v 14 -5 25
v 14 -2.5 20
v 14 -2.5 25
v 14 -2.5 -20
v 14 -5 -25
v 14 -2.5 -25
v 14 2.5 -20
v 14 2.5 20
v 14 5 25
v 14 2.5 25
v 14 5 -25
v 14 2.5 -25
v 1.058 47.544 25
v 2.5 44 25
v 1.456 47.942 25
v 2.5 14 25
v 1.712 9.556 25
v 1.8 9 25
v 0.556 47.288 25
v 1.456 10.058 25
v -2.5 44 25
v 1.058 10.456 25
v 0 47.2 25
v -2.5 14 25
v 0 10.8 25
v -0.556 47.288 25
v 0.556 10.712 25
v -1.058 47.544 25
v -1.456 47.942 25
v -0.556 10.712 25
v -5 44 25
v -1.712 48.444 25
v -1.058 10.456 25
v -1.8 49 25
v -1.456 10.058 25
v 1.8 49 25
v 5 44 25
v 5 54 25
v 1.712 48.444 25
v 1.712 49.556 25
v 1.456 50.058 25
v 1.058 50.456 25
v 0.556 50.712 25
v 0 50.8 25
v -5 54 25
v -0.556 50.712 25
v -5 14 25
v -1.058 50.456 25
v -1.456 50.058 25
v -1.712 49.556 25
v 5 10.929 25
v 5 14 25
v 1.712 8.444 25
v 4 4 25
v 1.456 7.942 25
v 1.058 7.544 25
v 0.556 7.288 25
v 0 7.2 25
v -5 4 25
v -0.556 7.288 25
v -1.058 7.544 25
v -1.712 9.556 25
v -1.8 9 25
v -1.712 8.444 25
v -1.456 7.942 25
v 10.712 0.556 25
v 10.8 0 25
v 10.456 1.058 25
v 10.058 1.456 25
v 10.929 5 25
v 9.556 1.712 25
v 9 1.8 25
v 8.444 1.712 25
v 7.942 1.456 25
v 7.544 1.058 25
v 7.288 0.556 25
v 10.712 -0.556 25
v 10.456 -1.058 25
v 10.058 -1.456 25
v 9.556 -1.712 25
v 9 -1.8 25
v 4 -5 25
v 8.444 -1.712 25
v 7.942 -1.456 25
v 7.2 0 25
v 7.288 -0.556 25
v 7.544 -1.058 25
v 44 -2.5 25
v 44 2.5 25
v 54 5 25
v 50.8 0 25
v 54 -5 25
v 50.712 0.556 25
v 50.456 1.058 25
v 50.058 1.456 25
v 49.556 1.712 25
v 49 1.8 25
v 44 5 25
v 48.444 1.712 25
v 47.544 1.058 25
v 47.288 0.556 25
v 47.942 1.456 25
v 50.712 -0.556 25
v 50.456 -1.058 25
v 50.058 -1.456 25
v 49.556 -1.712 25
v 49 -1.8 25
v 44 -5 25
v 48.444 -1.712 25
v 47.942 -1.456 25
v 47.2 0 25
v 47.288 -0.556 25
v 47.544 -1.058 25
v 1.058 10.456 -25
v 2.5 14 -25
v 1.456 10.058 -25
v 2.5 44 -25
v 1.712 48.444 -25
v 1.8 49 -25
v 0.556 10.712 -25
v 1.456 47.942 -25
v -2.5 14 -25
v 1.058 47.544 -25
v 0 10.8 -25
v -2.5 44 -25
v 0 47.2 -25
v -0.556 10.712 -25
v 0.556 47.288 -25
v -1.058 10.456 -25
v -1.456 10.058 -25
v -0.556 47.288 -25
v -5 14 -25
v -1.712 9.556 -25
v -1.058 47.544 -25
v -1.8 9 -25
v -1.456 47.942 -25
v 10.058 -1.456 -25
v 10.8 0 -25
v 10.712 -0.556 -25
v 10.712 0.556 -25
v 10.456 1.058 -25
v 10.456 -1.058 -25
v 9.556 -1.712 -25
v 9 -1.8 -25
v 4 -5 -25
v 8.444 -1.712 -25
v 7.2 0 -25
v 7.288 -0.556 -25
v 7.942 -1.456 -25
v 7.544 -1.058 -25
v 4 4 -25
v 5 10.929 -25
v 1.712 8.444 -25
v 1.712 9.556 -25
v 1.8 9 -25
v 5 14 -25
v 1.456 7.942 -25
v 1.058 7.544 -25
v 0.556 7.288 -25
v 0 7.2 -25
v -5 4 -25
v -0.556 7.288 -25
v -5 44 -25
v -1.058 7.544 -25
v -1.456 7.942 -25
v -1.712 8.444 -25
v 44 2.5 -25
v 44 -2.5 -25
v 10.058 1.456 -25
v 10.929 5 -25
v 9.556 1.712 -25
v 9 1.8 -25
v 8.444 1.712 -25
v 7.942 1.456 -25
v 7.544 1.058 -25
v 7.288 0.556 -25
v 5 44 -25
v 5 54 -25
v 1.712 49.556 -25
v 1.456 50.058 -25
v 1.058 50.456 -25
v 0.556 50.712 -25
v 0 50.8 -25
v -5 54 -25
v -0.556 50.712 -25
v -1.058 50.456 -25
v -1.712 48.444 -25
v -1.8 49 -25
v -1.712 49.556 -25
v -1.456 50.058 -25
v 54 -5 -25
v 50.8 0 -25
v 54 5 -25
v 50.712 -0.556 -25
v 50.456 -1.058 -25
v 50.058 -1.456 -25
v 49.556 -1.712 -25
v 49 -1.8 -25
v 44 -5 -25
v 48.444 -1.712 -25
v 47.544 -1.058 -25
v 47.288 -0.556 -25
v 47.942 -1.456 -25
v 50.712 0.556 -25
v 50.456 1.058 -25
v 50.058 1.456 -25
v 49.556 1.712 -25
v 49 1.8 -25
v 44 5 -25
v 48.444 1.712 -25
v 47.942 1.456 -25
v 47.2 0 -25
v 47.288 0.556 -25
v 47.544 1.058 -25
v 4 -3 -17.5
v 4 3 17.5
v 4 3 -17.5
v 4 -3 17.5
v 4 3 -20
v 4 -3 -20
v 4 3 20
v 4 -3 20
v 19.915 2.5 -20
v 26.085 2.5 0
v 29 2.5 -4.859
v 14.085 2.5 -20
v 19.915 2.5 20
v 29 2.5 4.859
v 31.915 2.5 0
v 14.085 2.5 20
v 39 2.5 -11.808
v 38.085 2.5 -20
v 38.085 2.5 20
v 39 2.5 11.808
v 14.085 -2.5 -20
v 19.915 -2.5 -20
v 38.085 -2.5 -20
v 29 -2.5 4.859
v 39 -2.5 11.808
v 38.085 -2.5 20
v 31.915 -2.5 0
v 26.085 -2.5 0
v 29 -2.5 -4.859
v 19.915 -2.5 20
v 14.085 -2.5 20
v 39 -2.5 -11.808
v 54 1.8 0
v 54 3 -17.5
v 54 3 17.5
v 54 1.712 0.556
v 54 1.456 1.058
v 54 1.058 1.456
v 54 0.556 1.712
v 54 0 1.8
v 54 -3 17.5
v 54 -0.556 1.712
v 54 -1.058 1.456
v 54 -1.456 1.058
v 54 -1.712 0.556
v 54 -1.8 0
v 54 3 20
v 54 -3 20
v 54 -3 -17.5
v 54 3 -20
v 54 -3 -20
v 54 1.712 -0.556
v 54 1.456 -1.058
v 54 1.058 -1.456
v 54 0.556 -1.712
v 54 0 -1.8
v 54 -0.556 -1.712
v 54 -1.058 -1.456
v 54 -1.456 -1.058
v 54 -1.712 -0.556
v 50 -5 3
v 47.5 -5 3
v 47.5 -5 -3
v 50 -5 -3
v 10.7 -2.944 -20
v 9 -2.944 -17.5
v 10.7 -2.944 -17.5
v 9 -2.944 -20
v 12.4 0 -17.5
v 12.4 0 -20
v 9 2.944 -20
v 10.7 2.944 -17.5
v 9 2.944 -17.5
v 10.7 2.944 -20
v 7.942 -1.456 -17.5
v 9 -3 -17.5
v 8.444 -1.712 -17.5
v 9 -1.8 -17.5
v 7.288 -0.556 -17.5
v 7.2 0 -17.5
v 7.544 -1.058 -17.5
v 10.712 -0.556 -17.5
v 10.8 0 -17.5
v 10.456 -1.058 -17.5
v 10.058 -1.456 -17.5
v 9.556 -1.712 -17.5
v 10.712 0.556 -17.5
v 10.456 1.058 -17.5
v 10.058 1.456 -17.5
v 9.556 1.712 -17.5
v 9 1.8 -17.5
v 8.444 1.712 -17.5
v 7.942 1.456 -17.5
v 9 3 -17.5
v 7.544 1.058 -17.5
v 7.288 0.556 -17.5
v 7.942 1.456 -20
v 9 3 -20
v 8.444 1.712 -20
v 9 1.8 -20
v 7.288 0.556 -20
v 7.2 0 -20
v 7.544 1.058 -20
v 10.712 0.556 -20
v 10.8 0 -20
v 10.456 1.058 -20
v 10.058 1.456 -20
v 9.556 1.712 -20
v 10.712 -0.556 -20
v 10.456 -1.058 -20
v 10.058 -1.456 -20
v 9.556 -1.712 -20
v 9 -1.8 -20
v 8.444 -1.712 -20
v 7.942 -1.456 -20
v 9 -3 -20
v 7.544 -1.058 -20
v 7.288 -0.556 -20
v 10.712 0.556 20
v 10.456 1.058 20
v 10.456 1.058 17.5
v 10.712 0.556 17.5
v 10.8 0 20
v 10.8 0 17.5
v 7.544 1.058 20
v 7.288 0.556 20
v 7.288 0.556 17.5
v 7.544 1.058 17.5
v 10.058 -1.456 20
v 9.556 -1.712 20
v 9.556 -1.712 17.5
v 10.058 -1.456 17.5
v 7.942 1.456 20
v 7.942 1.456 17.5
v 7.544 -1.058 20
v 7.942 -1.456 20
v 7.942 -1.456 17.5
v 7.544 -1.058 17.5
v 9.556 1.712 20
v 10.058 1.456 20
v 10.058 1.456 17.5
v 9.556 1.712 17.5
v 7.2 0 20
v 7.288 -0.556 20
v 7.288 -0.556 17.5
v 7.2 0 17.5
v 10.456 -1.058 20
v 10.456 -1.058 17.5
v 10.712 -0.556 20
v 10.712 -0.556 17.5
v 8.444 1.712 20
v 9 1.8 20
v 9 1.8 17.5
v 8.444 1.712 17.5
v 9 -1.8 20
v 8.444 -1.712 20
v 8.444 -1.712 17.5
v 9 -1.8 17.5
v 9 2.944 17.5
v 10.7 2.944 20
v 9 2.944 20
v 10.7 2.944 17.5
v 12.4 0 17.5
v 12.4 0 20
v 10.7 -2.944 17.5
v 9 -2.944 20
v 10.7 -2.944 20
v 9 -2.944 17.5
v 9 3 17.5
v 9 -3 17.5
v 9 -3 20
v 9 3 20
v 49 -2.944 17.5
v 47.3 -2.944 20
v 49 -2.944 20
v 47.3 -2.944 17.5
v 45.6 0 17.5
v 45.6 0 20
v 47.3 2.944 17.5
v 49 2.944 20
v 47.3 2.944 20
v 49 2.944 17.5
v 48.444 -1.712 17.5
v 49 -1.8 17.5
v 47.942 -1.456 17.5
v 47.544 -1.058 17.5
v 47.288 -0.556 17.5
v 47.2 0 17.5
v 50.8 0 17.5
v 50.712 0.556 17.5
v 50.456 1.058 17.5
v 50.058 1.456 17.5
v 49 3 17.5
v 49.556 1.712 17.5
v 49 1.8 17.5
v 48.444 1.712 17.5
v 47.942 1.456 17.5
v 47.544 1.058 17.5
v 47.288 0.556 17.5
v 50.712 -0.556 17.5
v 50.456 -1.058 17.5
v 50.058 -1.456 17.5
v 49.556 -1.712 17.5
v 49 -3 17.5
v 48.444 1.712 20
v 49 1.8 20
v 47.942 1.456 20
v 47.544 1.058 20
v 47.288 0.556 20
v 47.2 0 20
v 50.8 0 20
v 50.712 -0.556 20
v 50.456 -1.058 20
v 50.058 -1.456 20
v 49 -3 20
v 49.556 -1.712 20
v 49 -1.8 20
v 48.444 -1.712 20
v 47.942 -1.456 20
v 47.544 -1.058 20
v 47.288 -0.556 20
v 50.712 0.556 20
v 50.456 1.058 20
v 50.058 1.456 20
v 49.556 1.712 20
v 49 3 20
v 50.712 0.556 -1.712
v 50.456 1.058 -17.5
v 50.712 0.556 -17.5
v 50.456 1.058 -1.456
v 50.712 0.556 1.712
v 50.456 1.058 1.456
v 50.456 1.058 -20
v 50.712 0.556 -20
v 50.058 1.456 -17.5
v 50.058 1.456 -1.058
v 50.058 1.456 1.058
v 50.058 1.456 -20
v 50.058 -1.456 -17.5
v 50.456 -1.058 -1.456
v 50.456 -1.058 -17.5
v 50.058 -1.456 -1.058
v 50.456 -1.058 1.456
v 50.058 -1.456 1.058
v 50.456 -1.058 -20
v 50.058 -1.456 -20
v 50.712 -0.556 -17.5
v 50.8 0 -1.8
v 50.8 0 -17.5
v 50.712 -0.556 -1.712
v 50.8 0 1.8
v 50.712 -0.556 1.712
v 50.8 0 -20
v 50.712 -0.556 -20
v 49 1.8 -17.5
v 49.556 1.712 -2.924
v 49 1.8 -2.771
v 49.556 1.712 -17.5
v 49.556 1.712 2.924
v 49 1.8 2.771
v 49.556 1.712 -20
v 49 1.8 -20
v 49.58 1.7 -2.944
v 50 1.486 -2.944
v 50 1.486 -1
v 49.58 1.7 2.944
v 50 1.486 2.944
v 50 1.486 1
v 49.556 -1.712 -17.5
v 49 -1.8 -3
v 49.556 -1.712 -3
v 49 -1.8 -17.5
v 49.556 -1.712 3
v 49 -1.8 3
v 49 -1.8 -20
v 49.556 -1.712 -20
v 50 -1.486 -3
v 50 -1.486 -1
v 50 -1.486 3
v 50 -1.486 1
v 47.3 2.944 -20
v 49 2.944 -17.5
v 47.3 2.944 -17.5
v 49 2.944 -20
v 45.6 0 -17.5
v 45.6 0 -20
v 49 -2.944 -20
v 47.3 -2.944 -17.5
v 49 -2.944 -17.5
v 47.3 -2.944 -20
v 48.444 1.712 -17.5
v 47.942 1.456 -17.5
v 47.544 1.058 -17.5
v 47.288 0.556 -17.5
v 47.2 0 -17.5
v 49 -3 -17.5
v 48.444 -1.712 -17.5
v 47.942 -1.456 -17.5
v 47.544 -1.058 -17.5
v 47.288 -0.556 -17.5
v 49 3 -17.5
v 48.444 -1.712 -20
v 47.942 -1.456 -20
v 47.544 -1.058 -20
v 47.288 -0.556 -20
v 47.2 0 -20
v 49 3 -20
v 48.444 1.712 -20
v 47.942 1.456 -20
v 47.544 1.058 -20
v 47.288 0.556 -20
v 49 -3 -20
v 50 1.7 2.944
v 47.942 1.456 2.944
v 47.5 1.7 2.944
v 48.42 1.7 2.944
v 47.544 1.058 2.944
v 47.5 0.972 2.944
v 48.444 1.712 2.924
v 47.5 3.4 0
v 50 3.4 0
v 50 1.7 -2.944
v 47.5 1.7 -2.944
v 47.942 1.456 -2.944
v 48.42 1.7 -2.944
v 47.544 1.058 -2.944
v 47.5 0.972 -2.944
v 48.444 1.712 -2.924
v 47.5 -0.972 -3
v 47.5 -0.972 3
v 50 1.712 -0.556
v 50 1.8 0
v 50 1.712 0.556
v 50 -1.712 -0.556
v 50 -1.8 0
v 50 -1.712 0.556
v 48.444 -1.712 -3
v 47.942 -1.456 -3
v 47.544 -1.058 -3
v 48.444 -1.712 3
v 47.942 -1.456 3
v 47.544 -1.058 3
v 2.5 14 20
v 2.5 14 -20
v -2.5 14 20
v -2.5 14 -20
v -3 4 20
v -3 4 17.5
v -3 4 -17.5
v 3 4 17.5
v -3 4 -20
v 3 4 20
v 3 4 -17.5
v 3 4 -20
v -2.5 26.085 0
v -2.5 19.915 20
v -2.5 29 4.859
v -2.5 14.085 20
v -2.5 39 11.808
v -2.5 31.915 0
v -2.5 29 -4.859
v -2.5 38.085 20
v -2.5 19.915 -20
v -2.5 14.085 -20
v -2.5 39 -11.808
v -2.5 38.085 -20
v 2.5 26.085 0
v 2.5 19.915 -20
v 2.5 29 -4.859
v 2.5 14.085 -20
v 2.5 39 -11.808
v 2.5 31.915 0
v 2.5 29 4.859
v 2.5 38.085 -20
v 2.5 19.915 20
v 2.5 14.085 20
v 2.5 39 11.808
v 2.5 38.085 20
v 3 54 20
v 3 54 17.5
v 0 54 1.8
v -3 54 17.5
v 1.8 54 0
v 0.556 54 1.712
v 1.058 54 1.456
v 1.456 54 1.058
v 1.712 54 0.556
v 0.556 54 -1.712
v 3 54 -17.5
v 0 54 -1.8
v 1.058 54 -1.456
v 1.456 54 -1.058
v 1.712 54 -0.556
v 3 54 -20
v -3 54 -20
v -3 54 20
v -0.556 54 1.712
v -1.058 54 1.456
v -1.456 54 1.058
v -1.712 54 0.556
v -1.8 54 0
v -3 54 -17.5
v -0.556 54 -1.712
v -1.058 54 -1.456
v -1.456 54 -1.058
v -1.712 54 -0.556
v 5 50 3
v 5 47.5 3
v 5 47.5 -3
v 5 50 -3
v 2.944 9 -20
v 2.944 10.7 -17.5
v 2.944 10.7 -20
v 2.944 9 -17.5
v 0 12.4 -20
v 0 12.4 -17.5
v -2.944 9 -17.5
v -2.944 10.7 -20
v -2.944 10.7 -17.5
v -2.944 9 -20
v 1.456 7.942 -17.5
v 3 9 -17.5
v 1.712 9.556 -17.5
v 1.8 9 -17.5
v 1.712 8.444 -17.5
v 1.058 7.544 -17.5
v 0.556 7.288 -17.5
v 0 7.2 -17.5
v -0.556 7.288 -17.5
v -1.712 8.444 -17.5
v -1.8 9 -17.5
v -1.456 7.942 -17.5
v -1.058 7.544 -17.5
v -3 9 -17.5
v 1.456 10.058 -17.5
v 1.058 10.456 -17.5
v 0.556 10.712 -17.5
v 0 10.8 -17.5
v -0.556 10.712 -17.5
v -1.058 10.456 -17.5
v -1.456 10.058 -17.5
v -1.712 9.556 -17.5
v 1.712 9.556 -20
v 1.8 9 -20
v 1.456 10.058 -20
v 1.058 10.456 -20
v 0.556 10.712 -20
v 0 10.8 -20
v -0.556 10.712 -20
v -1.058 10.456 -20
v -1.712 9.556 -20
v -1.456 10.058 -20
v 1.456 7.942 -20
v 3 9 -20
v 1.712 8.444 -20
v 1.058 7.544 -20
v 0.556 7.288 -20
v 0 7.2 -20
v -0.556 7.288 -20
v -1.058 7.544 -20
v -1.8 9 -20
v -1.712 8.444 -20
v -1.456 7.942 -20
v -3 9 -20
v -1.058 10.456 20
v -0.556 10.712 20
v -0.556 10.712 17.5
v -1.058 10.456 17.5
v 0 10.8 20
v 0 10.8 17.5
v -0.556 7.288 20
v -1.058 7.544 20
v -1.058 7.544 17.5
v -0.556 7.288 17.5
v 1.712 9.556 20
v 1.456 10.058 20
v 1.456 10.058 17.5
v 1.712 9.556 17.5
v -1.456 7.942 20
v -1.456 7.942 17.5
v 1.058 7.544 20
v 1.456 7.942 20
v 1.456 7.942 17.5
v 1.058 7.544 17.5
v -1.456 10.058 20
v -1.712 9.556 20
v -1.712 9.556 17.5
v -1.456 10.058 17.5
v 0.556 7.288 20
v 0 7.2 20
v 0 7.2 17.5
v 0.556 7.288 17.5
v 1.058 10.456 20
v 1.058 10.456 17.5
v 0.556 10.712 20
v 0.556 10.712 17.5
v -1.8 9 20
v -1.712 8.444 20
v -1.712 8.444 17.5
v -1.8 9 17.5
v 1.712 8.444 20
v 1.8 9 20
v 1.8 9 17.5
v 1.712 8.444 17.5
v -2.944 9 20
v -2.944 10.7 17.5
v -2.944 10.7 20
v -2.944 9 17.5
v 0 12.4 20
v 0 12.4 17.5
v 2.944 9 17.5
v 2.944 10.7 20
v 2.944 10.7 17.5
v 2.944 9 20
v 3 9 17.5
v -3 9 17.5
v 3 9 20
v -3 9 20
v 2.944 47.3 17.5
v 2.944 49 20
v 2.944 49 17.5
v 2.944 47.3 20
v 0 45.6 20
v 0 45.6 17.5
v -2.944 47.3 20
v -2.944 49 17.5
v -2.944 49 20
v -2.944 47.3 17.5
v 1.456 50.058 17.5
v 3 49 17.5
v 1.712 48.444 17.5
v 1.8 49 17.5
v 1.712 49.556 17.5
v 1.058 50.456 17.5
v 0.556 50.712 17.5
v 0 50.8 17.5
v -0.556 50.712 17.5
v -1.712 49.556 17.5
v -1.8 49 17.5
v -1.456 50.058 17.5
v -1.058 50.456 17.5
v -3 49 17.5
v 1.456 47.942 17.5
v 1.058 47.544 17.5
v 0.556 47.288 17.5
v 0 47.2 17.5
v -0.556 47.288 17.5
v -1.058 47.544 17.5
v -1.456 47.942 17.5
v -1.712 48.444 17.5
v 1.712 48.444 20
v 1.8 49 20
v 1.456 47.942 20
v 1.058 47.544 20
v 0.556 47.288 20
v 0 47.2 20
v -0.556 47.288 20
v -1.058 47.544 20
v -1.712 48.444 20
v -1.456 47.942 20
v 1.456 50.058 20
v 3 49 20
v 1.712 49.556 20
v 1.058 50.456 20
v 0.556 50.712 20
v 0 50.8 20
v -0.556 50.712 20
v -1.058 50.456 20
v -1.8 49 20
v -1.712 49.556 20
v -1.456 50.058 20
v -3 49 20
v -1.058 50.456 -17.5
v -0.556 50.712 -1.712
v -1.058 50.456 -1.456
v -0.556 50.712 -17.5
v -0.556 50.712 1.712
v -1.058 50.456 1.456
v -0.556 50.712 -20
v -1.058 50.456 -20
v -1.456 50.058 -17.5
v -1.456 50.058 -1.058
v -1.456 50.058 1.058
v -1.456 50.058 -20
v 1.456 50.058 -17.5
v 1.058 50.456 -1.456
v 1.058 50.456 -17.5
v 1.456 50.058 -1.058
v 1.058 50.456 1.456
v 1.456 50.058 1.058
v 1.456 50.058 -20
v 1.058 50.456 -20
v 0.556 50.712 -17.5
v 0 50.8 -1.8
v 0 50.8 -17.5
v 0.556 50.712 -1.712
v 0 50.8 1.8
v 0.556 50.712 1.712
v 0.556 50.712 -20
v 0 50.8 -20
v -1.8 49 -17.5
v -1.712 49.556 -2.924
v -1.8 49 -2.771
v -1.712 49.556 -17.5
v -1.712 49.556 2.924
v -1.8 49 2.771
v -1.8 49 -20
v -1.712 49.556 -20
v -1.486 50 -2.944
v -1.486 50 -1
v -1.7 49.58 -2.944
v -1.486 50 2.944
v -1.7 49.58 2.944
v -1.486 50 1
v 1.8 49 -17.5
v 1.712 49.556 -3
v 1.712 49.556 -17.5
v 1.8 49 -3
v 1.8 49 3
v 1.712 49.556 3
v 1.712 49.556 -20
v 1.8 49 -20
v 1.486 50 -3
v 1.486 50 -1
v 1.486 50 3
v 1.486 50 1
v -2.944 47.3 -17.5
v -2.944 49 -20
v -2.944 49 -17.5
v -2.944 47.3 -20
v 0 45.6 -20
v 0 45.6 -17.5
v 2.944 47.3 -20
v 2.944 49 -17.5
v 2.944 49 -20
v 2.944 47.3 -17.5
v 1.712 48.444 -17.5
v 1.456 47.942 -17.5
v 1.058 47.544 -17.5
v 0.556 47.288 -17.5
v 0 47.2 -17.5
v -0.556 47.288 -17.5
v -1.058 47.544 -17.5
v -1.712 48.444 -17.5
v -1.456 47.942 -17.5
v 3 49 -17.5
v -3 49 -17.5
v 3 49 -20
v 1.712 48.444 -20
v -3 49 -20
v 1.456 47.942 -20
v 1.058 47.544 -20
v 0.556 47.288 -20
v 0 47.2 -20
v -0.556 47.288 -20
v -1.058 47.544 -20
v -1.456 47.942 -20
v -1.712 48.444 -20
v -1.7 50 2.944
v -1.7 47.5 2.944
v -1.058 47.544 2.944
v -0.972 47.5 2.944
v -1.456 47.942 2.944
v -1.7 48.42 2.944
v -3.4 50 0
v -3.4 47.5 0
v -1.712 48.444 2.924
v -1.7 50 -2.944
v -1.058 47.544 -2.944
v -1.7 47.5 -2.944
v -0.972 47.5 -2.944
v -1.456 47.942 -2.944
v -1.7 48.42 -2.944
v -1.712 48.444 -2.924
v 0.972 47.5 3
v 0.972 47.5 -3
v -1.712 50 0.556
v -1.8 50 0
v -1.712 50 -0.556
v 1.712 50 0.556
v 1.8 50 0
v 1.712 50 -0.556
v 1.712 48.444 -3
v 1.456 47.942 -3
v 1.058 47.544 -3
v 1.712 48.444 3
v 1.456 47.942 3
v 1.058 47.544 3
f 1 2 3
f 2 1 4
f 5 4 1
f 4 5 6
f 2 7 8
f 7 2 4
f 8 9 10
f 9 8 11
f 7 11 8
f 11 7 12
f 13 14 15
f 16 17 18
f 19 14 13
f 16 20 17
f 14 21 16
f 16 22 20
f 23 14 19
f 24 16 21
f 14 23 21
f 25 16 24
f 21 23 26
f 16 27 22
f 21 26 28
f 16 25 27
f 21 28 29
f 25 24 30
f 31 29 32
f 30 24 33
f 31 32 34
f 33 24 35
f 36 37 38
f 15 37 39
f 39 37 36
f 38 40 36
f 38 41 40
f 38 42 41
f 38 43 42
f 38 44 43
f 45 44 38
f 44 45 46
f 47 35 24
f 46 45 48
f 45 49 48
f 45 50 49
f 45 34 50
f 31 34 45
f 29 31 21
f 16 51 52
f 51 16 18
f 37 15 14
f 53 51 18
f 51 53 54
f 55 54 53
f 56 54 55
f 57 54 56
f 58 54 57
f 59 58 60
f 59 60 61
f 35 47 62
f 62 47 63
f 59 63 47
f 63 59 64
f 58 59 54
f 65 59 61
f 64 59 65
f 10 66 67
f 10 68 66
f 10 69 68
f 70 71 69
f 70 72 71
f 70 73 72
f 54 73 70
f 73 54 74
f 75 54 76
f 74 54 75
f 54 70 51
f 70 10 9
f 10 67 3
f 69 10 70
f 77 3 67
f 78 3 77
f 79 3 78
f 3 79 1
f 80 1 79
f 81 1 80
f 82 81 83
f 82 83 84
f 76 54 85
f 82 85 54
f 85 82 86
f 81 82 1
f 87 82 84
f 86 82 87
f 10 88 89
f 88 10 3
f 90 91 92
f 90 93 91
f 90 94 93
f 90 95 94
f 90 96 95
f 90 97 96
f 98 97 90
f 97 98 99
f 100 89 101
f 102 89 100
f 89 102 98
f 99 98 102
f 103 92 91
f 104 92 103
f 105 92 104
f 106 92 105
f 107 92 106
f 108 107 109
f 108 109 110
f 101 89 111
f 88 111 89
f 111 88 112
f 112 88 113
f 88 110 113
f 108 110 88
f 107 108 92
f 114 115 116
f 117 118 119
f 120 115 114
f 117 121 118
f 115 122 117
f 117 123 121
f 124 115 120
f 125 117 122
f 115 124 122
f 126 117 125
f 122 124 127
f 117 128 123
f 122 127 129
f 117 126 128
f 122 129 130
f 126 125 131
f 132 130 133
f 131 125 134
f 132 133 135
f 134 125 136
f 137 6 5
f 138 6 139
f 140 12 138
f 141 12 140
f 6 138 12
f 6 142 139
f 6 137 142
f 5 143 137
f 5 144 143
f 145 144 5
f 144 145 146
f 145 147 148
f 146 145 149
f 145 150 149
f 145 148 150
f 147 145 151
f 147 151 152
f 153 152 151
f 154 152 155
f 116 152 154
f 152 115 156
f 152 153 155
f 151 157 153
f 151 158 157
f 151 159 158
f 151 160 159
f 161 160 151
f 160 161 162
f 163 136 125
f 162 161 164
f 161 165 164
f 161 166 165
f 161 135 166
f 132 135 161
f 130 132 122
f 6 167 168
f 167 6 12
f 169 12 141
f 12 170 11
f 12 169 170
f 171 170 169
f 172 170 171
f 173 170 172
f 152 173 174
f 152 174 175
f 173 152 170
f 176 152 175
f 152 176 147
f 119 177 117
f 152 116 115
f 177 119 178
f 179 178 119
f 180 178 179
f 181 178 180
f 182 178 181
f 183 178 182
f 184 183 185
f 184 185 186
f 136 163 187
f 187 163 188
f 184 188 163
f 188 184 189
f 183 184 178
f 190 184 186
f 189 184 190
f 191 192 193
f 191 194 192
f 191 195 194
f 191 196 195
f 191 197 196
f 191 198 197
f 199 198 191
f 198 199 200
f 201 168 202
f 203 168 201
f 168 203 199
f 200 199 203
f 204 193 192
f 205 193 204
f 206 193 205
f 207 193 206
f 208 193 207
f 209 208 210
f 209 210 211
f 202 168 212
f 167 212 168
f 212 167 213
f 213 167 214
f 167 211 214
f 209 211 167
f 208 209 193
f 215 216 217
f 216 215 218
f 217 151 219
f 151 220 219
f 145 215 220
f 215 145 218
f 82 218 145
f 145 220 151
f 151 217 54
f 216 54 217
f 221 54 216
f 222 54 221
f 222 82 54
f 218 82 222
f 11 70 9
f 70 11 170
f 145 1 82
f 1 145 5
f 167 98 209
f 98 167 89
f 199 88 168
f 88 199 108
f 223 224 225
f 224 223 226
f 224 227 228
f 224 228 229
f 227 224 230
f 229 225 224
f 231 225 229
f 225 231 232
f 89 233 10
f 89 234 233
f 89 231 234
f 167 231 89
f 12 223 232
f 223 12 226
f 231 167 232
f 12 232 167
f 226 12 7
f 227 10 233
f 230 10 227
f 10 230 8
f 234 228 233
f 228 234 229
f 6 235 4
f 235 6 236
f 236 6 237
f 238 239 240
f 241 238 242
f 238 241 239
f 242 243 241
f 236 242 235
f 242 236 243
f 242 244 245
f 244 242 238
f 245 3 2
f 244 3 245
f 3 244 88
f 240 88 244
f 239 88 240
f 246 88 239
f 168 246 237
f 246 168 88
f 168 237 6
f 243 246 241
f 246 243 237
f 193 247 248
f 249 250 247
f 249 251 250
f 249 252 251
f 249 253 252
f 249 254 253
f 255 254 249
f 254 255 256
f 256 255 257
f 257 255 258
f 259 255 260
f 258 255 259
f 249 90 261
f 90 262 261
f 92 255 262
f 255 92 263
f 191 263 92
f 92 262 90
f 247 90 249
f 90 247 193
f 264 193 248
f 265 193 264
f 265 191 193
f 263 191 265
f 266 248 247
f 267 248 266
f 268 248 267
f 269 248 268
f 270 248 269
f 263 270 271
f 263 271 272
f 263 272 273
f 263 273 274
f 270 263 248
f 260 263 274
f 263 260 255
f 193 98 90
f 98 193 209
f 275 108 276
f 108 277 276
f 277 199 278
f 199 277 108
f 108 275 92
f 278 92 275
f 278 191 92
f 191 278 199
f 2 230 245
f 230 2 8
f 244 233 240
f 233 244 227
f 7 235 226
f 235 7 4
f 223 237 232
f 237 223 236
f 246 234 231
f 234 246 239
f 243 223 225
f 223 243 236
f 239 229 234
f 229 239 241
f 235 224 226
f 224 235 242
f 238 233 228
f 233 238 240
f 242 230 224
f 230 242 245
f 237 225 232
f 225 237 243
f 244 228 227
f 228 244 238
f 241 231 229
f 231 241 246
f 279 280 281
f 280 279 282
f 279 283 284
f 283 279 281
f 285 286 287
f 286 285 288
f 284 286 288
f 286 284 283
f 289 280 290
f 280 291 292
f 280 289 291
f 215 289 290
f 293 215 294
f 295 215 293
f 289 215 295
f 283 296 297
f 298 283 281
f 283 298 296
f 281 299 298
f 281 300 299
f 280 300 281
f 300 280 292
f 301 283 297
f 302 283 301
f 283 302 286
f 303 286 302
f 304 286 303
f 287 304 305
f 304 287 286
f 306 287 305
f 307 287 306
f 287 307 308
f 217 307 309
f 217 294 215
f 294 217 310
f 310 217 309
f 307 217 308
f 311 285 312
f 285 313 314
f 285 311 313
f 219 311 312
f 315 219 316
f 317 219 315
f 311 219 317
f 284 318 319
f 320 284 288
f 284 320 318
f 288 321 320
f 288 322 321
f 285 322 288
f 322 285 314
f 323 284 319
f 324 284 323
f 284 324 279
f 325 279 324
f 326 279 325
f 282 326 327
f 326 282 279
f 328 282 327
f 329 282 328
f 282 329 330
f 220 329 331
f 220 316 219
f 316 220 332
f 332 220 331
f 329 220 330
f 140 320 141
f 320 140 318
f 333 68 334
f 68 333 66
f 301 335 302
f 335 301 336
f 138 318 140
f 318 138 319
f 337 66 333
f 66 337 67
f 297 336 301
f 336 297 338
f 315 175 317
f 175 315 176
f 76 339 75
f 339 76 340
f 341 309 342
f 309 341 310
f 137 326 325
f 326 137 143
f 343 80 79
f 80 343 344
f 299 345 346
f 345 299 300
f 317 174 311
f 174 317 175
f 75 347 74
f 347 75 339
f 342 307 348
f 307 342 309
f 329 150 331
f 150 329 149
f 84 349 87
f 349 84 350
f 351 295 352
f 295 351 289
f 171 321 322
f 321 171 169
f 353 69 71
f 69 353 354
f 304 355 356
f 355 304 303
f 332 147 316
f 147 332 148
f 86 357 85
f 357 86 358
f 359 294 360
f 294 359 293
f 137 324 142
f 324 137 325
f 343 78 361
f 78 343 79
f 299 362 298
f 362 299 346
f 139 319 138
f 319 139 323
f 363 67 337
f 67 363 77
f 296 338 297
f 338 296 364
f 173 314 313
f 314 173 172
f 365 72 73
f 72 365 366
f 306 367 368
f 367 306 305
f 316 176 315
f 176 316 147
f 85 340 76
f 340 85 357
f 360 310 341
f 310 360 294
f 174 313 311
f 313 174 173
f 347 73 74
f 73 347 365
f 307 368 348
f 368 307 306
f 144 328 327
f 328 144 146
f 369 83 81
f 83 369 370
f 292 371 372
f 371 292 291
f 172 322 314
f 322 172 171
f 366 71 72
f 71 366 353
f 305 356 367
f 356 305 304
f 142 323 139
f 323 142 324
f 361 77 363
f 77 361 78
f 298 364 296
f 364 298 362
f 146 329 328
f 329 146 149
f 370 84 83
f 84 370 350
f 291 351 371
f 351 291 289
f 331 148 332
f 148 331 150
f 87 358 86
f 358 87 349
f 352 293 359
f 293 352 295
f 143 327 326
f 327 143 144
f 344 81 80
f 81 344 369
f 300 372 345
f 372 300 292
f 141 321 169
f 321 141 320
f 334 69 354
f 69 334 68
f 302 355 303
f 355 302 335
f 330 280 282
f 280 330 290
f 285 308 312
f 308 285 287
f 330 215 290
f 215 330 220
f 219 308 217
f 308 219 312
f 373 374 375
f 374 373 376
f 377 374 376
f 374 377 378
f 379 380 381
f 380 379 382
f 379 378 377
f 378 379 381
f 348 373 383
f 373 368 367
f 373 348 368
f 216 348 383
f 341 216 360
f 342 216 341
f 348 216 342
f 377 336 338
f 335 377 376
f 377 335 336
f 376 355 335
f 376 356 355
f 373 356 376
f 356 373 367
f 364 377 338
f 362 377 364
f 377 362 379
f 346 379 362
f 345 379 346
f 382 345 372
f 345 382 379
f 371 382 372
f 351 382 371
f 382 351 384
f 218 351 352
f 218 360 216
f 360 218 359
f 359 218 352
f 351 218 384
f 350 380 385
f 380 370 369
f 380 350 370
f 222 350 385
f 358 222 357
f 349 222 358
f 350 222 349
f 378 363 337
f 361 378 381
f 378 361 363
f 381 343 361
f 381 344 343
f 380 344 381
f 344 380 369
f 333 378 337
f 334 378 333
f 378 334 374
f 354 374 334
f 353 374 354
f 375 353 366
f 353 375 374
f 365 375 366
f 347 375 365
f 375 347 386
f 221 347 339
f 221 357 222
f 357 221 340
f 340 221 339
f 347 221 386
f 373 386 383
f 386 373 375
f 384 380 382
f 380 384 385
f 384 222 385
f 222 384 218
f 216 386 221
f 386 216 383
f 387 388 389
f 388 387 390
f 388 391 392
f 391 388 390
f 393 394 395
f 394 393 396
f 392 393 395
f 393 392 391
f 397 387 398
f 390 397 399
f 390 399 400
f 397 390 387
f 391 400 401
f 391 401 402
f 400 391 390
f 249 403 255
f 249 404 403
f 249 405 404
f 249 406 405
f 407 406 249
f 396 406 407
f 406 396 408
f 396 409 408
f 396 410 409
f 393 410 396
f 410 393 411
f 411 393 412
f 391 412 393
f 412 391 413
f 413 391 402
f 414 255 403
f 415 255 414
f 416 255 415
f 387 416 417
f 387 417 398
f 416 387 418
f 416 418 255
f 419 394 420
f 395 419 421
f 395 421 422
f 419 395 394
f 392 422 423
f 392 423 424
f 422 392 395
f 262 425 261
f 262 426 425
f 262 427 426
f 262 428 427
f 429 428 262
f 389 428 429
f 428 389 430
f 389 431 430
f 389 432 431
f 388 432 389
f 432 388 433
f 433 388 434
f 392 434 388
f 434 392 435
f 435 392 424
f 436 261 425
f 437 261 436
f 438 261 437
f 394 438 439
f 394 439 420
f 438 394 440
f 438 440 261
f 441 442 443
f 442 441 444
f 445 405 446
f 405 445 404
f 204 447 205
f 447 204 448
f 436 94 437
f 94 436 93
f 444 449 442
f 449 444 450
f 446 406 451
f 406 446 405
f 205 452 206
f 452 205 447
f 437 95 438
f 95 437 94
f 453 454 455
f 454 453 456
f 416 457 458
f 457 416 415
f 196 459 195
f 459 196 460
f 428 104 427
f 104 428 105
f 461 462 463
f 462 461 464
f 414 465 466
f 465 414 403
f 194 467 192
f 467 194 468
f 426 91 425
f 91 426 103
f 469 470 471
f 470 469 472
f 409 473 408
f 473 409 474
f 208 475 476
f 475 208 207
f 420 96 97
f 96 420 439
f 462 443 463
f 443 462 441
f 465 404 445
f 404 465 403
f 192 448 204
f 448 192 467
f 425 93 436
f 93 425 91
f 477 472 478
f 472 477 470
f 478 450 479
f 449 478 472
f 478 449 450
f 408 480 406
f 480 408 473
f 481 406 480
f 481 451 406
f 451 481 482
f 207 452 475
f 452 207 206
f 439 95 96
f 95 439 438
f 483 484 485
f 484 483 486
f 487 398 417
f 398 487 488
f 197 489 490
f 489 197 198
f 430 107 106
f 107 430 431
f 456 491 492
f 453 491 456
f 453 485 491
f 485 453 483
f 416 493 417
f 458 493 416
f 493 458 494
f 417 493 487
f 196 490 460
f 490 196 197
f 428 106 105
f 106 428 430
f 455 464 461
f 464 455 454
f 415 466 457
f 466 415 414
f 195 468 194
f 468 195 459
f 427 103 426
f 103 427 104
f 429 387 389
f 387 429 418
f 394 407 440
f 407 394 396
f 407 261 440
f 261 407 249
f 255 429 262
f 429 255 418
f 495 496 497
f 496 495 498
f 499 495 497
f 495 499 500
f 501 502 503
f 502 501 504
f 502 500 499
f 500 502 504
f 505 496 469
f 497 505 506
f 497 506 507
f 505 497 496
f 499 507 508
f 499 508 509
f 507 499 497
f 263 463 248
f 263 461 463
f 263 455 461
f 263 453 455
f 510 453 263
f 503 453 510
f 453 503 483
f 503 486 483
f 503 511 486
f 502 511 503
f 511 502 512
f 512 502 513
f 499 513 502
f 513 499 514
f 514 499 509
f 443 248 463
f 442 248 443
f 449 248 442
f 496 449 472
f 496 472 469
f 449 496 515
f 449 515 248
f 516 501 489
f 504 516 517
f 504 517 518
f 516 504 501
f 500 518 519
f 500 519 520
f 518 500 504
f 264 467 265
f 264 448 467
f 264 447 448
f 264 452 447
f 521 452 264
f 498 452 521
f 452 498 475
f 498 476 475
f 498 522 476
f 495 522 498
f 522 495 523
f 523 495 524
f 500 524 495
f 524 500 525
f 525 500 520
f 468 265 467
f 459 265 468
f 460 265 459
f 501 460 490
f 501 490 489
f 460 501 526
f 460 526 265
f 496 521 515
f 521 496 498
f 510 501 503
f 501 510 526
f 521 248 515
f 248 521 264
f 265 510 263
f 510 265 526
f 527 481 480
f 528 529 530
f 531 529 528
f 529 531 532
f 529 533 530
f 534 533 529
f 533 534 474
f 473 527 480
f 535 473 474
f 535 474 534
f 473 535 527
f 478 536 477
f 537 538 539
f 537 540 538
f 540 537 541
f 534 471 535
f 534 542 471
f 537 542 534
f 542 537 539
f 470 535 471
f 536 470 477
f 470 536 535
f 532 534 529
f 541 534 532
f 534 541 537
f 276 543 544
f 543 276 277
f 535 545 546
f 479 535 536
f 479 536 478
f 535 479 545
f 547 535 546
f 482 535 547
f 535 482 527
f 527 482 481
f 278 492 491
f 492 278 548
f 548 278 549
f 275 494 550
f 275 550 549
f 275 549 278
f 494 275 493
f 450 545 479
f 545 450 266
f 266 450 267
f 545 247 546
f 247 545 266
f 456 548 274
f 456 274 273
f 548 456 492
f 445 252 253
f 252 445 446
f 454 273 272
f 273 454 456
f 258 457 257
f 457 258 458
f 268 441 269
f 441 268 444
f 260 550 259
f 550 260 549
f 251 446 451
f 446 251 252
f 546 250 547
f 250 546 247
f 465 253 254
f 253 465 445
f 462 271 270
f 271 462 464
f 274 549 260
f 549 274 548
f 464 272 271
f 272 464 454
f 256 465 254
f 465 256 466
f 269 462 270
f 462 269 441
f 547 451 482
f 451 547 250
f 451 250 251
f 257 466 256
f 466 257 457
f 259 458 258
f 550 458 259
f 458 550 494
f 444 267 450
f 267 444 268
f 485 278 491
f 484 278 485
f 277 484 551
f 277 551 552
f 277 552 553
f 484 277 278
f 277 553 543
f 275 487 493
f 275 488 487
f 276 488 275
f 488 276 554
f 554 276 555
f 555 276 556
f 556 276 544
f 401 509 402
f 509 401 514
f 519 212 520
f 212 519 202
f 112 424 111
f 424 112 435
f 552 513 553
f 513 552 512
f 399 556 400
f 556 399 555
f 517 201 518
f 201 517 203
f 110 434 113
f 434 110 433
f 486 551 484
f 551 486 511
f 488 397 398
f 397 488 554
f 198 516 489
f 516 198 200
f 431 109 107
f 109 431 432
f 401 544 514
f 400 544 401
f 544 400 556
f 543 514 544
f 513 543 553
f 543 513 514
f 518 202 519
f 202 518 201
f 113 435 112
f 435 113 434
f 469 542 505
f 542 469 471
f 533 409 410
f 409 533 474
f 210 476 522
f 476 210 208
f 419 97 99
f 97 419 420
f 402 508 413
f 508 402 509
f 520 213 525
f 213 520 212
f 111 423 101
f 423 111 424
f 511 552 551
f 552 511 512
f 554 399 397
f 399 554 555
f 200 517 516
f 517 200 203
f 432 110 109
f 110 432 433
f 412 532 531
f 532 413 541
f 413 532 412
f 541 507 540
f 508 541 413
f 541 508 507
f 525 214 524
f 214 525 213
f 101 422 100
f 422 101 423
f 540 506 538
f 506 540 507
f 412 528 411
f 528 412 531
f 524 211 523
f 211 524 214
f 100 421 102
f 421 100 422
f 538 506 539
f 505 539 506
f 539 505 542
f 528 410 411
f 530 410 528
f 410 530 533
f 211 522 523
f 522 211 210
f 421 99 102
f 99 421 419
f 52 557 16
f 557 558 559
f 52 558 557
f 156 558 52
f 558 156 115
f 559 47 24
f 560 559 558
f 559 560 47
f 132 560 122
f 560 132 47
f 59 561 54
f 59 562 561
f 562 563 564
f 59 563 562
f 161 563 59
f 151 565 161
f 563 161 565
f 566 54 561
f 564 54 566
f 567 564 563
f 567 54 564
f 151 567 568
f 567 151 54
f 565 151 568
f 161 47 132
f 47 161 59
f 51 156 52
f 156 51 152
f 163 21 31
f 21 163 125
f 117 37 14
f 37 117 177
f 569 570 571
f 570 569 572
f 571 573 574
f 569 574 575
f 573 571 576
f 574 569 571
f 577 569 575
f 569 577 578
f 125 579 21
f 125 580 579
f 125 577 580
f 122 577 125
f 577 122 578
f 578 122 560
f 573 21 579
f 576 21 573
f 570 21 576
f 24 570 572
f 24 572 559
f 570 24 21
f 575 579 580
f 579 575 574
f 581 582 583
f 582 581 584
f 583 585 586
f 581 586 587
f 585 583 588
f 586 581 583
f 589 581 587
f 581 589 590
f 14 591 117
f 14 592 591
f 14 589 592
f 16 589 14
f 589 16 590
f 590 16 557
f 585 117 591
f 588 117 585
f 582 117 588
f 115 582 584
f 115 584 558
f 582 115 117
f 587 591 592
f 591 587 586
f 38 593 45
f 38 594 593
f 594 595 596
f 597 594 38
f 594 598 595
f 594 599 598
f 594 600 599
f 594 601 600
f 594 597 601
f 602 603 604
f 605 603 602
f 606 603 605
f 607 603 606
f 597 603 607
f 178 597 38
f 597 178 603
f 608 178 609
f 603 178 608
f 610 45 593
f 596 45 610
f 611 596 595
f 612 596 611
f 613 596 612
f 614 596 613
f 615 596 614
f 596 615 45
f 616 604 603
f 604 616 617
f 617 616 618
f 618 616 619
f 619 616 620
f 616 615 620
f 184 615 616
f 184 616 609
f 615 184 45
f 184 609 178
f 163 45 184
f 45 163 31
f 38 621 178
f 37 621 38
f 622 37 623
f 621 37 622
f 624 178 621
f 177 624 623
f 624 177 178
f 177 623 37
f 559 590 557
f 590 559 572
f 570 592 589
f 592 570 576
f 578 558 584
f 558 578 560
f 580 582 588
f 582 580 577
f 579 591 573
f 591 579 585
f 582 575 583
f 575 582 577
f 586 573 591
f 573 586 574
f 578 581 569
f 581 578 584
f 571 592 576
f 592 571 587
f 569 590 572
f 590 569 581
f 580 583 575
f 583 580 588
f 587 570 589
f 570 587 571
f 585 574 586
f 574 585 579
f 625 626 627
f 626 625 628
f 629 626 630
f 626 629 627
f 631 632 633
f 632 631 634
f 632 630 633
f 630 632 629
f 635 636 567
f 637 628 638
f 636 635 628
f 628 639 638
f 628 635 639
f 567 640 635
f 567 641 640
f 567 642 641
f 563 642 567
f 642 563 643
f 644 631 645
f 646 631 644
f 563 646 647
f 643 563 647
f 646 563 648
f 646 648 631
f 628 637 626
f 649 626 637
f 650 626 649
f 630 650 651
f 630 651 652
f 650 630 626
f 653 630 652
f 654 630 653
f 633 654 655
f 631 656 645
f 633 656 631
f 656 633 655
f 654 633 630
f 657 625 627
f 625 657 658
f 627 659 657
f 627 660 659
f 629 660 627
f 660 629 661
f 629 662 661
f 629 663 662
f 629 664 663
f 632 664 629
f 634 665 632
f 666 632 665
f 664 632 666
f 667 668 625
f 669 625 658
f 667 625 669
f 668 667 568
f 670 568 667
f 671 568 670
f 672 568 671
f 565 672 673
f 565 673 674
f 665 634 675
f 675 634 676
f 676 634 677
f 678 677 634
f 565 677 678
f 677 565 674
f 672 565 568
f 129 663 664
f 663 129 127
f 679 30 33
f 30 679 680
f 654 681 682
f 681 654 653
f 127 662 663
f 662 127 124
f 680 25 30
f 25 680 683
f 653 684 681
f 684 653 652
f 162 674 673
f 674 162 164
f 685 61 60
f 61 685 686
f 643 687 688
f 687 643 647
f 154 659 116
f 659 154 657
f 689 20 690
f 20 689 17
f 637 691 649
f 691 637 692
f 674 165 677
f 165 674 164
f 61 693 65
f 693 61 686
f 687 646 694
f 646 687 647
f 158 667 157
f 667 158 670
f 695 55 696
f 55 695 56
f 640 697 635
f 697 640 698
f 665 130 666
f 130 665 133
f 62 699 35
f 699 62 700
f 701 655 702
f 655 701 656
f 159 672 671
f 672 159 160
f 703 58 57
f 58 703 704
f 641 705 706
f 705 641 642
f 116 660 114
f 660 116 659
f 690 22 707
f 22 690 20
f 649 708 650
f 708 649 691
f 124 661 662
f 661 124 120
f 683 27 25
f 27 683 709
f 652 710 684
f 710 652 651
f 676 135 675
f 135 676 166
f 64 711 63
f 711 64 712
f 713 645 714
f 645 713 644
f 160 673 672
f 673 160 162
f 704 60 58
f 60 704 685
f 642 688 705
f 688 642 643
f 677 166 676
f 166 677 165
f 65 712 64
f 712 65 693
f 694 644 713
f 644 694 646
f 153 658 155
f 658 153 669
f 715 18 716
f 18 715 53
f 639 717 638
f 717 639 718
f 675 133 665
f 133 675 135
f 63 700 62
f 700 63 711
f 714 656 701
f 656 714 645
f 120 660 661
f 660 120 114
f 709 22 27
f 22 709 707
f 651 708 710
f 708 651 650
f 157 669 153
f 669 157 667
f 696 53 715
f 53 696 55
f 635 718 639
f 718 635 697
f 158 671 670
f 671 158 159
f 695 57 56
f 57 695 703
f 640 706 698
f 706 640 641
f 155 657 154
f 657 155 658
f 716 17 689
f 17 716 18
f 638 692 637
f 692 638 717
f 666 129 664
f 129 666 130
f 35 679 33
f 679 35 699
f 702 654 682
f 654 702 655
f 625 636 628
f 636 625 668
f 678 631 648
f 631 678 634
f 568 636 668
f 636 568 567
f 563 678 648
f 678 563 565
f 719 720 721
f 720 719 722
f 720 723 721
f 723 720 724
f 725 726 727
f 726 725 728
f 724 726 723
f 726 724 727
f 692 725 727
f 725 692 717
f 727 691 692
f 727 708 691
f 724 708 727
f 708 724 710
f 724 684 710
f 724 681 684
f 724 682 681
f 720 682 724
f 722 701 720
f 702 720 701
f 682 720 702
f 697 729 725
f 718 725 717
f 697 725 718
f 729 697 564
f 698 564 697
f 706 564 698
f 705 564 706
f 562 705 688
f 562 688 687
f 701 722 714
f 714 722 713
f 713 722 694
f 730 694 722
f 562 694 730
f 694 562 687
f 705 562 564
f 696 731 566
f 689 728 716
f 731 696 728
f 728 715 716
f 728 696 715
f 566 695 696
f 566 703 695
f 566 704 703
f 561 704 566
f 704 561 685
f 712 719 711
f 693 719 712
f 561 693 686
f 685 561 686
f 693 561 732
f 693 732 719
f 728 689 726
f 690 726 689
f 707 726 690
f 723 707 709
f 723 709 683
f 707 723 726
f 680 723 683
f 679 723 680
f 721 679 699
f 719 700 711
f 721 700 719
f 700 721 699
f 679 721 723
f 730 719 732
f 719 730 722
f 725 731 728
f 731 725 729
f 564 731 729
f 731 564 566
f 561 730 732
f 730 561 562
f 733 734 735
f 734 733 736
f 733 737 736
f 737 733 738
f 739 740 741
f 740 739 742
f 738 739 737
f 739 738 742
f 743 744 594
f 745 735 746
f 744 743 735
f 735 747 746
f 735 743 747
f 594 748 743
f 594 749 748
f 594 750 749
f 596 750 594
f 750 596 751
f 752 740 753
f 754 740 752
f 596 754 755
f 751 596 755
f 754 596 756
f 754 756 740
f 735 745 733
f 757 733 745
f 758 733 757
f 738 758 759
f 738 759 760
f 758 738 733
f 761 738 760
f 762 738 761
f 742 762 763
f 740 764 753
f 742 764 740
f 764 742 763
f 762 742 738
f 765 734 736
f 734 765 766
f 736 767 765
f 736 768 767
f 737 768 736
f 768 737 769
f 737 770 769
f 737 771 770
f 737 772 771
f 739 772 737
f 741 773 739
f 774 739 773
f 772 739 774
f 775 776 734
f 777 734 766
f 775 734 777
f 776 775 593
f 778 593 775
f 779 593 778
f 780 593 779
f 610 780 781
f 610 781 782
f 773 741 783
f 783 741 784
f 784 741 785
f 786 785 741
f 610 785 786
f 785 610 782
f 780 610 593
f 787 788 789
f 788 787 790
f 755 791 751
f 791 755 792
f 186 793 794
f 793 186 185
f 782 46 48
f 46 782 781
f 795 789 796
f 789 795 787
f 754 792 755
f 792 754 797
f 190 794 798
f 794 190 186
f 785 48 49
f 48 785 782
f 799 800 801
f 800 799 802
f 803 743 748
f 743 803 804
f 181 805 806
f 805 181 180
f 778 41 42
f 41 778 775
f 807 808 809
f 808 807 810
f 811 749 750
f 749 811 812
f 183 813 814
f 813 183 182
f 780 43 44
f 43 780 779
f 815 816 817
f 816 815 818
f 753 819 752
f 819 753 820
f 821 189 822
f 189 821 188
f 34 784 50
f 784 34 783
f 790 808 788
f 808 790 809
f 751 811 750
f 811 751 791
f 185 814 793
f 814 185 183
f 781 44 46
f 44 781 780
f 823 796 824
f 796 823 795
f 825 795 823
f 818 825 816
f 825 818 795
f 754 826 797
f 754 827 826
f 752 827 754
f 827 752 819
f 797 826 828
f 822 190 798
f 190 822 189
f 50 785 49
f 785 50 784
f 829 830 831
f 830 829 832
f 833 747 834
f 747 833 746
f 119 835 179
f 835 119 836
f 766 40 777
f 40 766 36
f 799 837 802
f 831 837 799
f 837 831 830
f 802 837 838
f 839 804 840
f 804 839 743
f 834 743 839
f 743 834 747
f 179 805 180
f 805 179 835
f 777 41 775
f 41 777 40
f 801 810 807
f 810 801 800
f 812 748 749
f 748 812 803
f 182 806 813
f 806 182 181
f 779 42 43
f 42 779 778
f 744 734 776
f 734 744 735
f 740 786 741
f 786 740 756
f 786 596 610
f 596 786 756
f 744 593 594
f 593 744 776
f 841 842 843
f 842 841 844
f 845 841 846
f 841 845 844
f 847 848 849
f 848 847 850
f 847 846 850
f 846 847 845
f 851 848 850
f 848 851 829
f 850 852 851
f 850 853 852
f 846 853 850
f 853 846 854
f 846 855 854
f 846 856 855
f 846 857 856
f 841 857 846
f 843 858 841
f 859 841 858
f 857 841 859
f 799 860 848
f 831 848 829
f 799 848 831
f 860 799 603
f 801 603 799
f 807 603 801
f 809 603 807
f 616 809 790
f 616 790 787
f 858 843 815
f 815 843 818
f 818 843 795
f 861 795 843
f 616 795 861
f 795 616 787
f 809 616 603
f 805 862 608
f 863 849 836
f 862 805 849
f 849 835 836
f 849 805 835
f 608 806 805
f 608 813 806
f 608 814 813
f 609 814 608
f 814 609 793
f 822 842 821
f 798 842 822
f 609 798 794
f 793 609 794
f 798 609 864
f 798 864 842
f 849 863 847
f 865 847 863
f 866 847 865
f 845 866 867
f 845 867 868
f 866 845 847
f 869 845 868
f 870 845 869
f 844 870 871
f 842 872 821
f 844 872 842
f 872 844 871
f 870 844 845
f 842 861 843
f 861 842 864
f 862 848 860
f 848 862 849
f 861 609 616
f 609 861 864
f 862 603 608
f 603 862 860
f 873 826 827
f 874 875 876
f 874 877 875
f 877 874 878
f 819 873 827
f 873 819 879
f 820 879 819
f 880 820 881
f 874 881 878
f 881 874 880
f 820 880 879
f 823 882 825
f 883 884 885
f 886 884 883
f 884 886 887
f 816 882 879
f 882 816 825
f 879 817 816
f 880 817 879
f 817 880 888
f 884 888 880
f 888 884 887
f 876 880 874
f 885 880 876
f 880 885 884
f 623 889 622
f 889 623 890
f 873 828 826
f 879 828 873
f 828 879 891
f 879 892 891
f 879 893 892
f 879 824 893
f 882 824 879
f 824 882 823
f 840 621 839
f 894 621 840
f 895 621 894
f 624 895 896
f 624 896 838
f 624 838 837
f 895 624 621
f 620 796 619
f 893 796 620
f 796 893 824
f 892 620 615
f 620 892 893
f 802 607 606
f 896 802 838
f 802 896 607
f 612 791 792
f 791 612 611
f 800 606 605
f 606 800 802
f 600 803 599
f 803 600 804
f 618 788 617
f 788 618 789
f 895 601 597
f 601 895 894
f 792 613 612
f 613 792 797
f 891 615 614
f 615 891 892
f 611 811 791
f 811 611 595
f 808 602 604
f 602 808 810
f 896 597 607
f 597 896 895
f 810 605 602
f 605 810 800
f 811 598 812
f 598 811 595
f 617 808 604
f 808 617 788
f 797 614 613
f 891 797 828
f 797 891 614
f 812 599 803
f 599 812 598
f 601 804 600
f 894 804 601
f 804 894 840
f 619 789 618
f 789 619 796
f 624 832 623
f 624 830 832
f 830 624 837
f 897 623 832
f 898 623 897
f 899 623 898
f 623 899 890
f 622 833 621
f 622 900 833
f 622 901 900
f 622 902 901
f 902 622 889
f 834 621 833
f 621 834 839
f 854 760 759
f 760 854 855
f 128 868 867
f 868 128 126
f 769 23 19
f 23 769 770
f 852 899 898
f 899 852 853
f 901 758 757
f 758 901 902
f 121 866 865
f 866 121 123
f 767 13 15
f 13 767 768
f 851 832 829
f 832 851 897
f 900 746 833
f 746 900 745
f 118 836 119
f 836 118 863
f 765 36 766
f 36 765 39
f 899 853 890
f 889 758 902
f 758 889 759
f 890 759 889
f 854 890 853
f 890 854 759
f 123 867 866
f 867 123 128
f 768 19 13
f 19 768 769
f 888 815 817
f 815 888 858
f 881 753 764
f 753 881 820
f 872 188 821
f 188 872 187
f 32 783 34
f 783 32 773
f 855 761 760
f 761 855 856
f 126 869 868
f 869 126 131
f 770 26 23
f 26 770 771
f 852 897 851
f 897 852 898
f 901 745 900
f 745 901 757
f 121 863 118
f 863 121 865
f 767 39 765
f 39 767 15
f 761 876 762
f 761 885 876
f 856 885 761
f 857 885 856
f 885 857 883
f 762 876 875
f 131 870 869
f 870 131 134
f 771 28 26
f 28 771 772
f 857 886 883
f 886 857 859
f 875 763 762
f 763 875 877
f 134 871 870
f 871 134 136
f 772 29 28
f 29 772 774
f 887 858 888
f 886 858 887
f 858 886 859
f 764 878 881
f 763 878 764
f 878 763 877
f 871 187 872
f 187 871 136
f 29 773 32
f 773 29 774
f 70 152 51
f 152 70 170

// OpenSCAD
// file: hex_trap.scad
function make_r_for_screw_standard(r_trap) =
((r_trap==2) ? 2.2 : (r_trap==2.5) ? 2.5 : (r_trap==3) ? 3.4 : (r_trap==4) ? 4.2 : r_trap);
//Utimaker 2 @ ESOC
//((r_trap==2) ? 2.2 : (r_trap==2.5) ? 2.5 : (r_trap==3) ? 3.2 : (r_trap==4) ? 4.2 : r_trap);

function make_r_hole_for_screw_standard(r_trap) =
((r_trap==2) ? 1.1 : (r_trap==2.5) ? 1.5 : (r_trap==3) ? 1.8 : (r_trap==4) ? 2.5 : r_trap);
//Ultimaker2 @ ESOC
//((r_trap==2) ? 1.5 : (r_trap==2.5) ? 2 : (r_trap==3) ? 2 : (r_trap==4) ? 2.5 : r_trap);

module hex_hole(h_trap,h_hole,r_trap,rot)
{
    
    echo("hex_hole h_trap[",h_trap,"]");
    echo("hex_hole h_hole[",h_hole,"]");
    local_r_trap=make_r_for_screw_standard(r_trap);
    echo("hex_hole r_trap[",r_trap,"]");
    local_r_hole=make_r_hole_for_screw_standard(r_trap);
    echo("hex_hole local_r_hole[",local_r_hole,"]");
    
    rotate([rot,0,0]) {
translate([0,0,h_hole])
{
	cylinder(h = h_trap, r = local_r_trap, $fn = 6);
}

	cylinder(h = h_hole, r = local_r_hole, $fn = 20);

}
}
module hex_hole_exit(h_trap,h_hole,r_trap,rot,l_exit,rot_exit)
{
    hex_hole(h_trap,h_hole,r_trap,rot);
    rotate([rot,0,0]) translate([0,r_trap,h_hole]) rotate([0,0,rot_exit]) cube([l_exit,r_trap*2,h_trap]);
    
}
module hex_hole_fill_bottom(h_trap,h_hole,r_trap,r_hole,rot)
{
    
    
    local_r_trap=make_r_for_screw_standard(r_trap);
    
    
    
    rotate([rot,0,0]) {
translate([0,0,h_hole-0.3])
{
	cylinder(h = 0.3, r = local_r_trap, $fn = 6);
}

	

}
}
module hex_hole_fill_top(h_trap,h_hole,r_trap,r_hole,rot)
{
    
    
    local_r_trap=make_r_for_screw_standard(r_trap);
    rotate([rot,0,0]) {


	cylinder(h = 0.3, r = r_hole, $fn = 20);

}
}
// file: ../configuration/general.scad
EXPLODE=0;

//Screw standards
SCREW_STANDARD_M3=3;
NUT_HEIGHT_M3=2.5;

//HDMI screen cover
HDMI_HOLES_LENGTH=157;
HDMI_HOLES_WIDTH=108;
GAP_MAINSCREWS_HDMI=3;
BASE_OUTERPAD_HDMI=2;
FRONT_COVER_TRAPS_TOLERANCE=0.1;



//Side plates
SIDE_HOLES_DIST=75;
SIDE_HOLES_GAP=20;
SIDE_PANEL_EXTENSION_WIDTH=30;
                    
//Back plate
BACK_PLATE_CENTER_BLOB=8;
BACK_PLATE_WALL=5;
BACK_PLATE_WALL_INNER=2.5;
BACK_PLATE_THICKNESS=9;
SCREW_BLOCK_SIZE=12;
BACK_PLATE_SENSORBOARD_X=40;
BACK_PLATE_SENSORBOARD_Y=10;
BACK_PLATE_RPI_BOARD_X=-40;
BACK_PLATE_RPI_BOARD_Y=10;
BACK_PLATE_ADAPTER0_THICKNESS=3;
BACK_PLATE_ADAPTER0_SPACING=100;
BACK_PLATE_SENSORBOARD_X=40;
BACK_PLATE_SENSORBOARD_Y=10;


//PILLARS
PILLARS_HEIGHT=50;
PILLARS_THICKNESS=BASE_OUTERPAD_HDMI+SCREW_STANDARD_M3*2+2;
PILLARS_THICKNESS2=5;
PILLARS_BOTTOM_OFFSET_X=0;
PILLARS_BOTTOM_OFFSET_Y=0;
PILLARS_TOP_OFFSET_X=0;
PILLARS_TOP_OFFSET_Y=0;

//Top panels
TOP_PANEL_DIST=50;
TOP_PANEL_GAP=25;
TOP_PANEL_EXTENSION_WITDH=30;

//Adapter0
CIRCUIT_BOARD_SCREWSTANDARD0=2;
CIRCUIT_BOARD_ADAPTER0_SPACING=10;
CIRCUIT_BOARD_ADAPTER0_SCREW_HEIGHT=6-BACK_PLATE_ADAPTER0_THICKNESS;
CIRCUIT_BOARD_ADAPTER0_SCREW_TRAP_HEIGHT=1.6;
CIRCUIT_BOARD_ADAPTER0_PLUS_WIDTH=5;
CIRCUIT_BOARD_ADAPTER0_BASE_WIDTH=CIRCUIT_BOARD_ADAPTER0_SPACING+10;
// main file
include <../configuration/general.scad>;
include <hex_trap.scad>;

module small_wall(across_width)
{
    
                
    difference()
    {
        //Build body small wall
        union()
        {
            intersection()
            {         
                union()
                {
                    cube([local_thickness,local_thickness,local_height],center=true);
                    translate([(across_width)/2+local_thickness/2,0,0]) cube([across_width,thickness2,local_height],center=true);
                    translate([(across_width)+local_thickness,0,0]) cube([local_thickness,local_thickness,local_height],center=true);
                }
                union()
                {
                    cube([local_thickness,local_thickness,local_height],center=true);
                    translate([(across_width)+local_thickness,0,0]) cube([local_thickness,local_thickness,local_height],center=true);
                    translate([(across_width)/2+local_thickness/2,0,local_height/2-thickness2/2]) cube ([across_width,thickness2,thickness2],center=true);
                    translate([(across_width)/2+local_thickness/2,0,-local_height/2+thickness2/2]) cube ([across_width,thickness2,thickness2],center=true);
                    translate([across_width+local_thickness/2-thickness2/2,0,0]) cube([thickness2,thickness2,local_height],center=true);
                    translate([across_width/2+local_thickness/2,0,0]) rotate([0,local_angle,0]) cube([thickness2,thickness2,local_diagonal],center=true);
                    translate([across_width/2+local_thickness/2,0,0]) rotate([0,-local_angle,0]) cube([thickness2,thickness2,local_diagonal],center=true);
                }
            }
        }
        //Remove components from small wall
        union()
        {
            translate([0,0,local_height*2])hex_hole(h_trap=0,h_hole=local_height*4,r_trap=SCREW_STANDARD_M3,rot=180);
            translate([(across_width)+local_thickness,0,local_height*2])hex_hole(h_trap=0,h_hole=local_height*4,r_trap=SCREW_STANDARD_M3,rot=180);
            translate([0,0,-local_height/2])hex_hole_exit(h_trap=NUT_HEIGHT_M3,h_hole=NUT_HEIGHT_M3*2,r_trap=SCREW_STANDARD_M3,rot=0,l_exit=thickness*2,rot_exit=-180);
            translate([0,0,local_height/2])hex_hole_exit(h_trap=NUT_HEIGHT_M3,h_hole=NUT_HEIGHT_M3*2,r_trap=SCREW_STANDARD_M3,rot=180,l_exit=thickness*2,rot_exit=-180);
            translate([across_width+local_thickness,0,local_height/2])rotate([0,0,180])hex_hole_exit(h_trap=NUT_HEIGHT_M3,h_hole=NUT_HEIGHT_M3*2,r_trap=SCREW_STANDARD_M3,rot=180,l_exit=thickness*2,rot_exit=-180);
            translate([across_width+local_thickness,0,-local_height/2])rotate([0,0,180])hex_hole_exit(h_trap=NUT_HEIGHT_M3,h_hole=NUT_HEIGHT_M3*2,r_trap=SCREW_STANDARD_M3,rot=0,l_exit=thickness*2,rot_exit=-180);
            //center hole+trap
            translate([across_width+local_thickness+local_thickness/2+1,0,0])rotate([90,0,0])rotate([0,90,0])hex_hole_exit(h_trap=NUT_HEIGHT_M3,h_hole=NUT_HEIGHT_M3*2,r_trap=SCREW_STANDARD_M3,rot=180,l_exit=thickness*2,rot_exit=-180);
        }
    }
    
   if (EXPLODE==1){ 
       translate([0,0,-local_height/2-30])hex_hole_exit(h_trap=NUT_HEIGHT_M3,h_hole=NUT_HEIGHT_M3*2+30,r_trap=SCREW_STANDARD_M3,rot=0,l_exit=thickness*2,rot_exit=-180);
        translate([0,0,30+local_height/2])hex_hole_exit(h_trap=NUT_HEIGHT_M3,h_hole=30+NUT_HEIGHT_M3*2,r_trap=SCREW_STANDARD_M3,rot=180,l_exit=thickness*2,rot_exit=-180);        
       translate([across_width+local_thickness,0,30+local_height/2])rotate([0,0,180])hex_hole_exit(h_trap=NUT_HEIGHT_M3,h_hole=30+NUT_HEIGHT_M3*2,r_trap=SCREW_STANDARD_M3,rot=180,l_exit=thickness*2,rot_exit=-180);
       translate([across_width+local_thickness,0,-30-local_height/2])rotate([0,0,180])hex_hole_exit(h_trap=NUT_HEIGHT_M3,h_hole=30+NUT_HEIGHT_M3*2,r_trap=SCREW_STANDARD_M3,rot=0,l_exit=thickness*2,rot_exit=-180);
       color([1,0,0])translate([across_width+local_thickness+local_thickness/2+1,0,0])rotate([90,0,0])rotate([0,90,0])hex_hole_exit(h_trap=NUT_HEIGHT_M3,h_hole=NUT_HEIGHT_M3*2,r_trap=SCREW_STANDARD_M3,rot=180,l_exit=thickness*2,rot_exit=-180);
   }
}
module pillar(thickness,thickness2,height,offset_bottom_x,offset_bottom_y,offset_top_x,offset_top_y,across_width,across_width_side)
{
    local_thickness=thickness;
    local_height=height;
    local_angle=atan2(across_width,local_height);
    local_diagonal=sqrt(local_height*local_height+across_width*across_width);
    difference()
    {
        union()
        {
            translate([GAP_MAINSCREWS_HDMI+SCREW_STANDARD_M3*2,0,0]){
            small_wall(local_thickness=local_thickness,local_height=local_height,across_width=across_width_side,thickness2=thickness2,local_angle=local_angle,local_diagonal=local_diagonal,thickness=thickness);
            }
            translate([0,GAP_MAINSCREWS_HDMI+SCREW_STANDARD_M3*2,0]) rotate([0,0,90]) {
                small_wall(local_thickness=local_thickness,local_height=local_height,across_width=across_width,thickness2=thickness2,local_angle=local_angle,local_diagonal=local_diagonal,thickness=thickness);   
            
            }
            translate([GAP_MAINSCREWS_HDMI+SCREW_STANDARD_M3*2,GAP_MAINSCREWS_HDMI+SCREW_STANDARD_M3*2,0])  {
                difference(){
                cube([local_thickness,local_thickness,local_height],center=true);
                translate([local_thickness/4,local_thickness/4,0])rotate([0,0,45])cube([local_thickness,local_thickness*2,local_height],center=true);
                }
                
            }
        }
        union()
        {
            ;//
            
        }
    }
    
      
}
module single_pillar()
{
    local_length=HDMI_HOLES_LENGTH+GAP_MAINSCREWS_HDMI*2+SCREW_STANDARD_M3*4;
local_width=HDMI_HOLES_WIDTH;
    pillar(thickness=PILLARS_THICKNESS,thickness2=PILLARS_THICKNESS2,height=PILLARS_HEIGHT,offset_bottom_x=PILLARS_BOTTOM_OFFSET_X,offset_bottom_y=PILLARS_BOTTOM_OFFSET_Y,offset_top_x=PILLARS_TOP_OFFSET_X,offset_top_y=PILLARS_TOP_OFFSET_Y,across_width=TOP_PANEL_EXTENSION_WITDH,across_width_side=SIDE_PANEL_EXTENSION_WIDTH);
}
module base_pillars()
{
local_length=HDMI_HOLES_LENGTH+GAP_MAINSCREWS_HDMI*2+SCREW_STANDARD_M3*4;
local_width=HDMI_HOLES_WIDTH;
    
translate([0,0,PILLARS_HEIGHT/2]){
translate([HDMI_HOLES_LENGTH/2,HDMI_HOLES_WIDTH/2,0]) /*rotate([0,0,90])*/
pillar(thickness=PILLARS_THICKNESS,thickness2=PILLARS_THICKNESS2,height=PILLARS_HEIGHT,offset_bottom_x=PILLARS_BOTTOM_OFFSET_X,offset_bottom_y=PILLARS_BOTTOM_OFFSET_Y,offset_top_x=PILLARS_TOP_OFFSET_X,offset_top_y=PILLARS_TOP_OFFSET_Y,across_width=TOP_PANEL_EXTENSION_WITDH,across_width_side=SIDE_PANEL_EXTENSION_WIDTH);
translate([-HDMI_HOLES_LENGTH/2,HDMI_HOLES_WIDTH/2,0]) rotate([0,0,90])
pillar(thickness=PILLARS_THICKNESS,thickness2=PILLARS_THICKNESS2,height=PILLARS_HEIGHT,offset_bottom_x=0,offset_bottom_y=0,offset_top_x=0,offset_top_y=0,across_width=TOP_PANEL_EXTENSION_WITDH,across_width_side=SIDE_PANEL_EXTENSION_WIDTH);
translate([HDMI_HOLES_LENGTH/2,-HDMI_HOLES_WIDTH/2,0]) rotate([0,0,-90])
pillar(thickness=PILLARS_THICKNESS,thickness2=PILLARS_THICKNESS2,height=PILLARS_HEIGHT,offset_bottom_x=0,offset_bottom_y=0,offset_top_x=0,offset_top_y=0,across_width=TOP_PANEL_EXTENSION_WITDH,across_width_side=SIDE_PANEL_EXTENSION_WIDTH);
translate([-HDMI_HOLES_LENGTH/2,-HDMI_HOLES_WIDTH/2,0]) rotate([0,0,-180])
pillar(thickness=PILLARS_THICKNESS,thickness2=PILLARS_THICKNESS2,height=PILLARS_HEIGHT,offset_bottom_x=0,offset_bottom_y=0,offset_top_x=0,offset_top_y=0,across_width=TOP_PANEL_EXTENSION_WITDH,across_width_side=SIDE_PANEL_EXTENSION_WIDTH);
}}
single_pillar();
